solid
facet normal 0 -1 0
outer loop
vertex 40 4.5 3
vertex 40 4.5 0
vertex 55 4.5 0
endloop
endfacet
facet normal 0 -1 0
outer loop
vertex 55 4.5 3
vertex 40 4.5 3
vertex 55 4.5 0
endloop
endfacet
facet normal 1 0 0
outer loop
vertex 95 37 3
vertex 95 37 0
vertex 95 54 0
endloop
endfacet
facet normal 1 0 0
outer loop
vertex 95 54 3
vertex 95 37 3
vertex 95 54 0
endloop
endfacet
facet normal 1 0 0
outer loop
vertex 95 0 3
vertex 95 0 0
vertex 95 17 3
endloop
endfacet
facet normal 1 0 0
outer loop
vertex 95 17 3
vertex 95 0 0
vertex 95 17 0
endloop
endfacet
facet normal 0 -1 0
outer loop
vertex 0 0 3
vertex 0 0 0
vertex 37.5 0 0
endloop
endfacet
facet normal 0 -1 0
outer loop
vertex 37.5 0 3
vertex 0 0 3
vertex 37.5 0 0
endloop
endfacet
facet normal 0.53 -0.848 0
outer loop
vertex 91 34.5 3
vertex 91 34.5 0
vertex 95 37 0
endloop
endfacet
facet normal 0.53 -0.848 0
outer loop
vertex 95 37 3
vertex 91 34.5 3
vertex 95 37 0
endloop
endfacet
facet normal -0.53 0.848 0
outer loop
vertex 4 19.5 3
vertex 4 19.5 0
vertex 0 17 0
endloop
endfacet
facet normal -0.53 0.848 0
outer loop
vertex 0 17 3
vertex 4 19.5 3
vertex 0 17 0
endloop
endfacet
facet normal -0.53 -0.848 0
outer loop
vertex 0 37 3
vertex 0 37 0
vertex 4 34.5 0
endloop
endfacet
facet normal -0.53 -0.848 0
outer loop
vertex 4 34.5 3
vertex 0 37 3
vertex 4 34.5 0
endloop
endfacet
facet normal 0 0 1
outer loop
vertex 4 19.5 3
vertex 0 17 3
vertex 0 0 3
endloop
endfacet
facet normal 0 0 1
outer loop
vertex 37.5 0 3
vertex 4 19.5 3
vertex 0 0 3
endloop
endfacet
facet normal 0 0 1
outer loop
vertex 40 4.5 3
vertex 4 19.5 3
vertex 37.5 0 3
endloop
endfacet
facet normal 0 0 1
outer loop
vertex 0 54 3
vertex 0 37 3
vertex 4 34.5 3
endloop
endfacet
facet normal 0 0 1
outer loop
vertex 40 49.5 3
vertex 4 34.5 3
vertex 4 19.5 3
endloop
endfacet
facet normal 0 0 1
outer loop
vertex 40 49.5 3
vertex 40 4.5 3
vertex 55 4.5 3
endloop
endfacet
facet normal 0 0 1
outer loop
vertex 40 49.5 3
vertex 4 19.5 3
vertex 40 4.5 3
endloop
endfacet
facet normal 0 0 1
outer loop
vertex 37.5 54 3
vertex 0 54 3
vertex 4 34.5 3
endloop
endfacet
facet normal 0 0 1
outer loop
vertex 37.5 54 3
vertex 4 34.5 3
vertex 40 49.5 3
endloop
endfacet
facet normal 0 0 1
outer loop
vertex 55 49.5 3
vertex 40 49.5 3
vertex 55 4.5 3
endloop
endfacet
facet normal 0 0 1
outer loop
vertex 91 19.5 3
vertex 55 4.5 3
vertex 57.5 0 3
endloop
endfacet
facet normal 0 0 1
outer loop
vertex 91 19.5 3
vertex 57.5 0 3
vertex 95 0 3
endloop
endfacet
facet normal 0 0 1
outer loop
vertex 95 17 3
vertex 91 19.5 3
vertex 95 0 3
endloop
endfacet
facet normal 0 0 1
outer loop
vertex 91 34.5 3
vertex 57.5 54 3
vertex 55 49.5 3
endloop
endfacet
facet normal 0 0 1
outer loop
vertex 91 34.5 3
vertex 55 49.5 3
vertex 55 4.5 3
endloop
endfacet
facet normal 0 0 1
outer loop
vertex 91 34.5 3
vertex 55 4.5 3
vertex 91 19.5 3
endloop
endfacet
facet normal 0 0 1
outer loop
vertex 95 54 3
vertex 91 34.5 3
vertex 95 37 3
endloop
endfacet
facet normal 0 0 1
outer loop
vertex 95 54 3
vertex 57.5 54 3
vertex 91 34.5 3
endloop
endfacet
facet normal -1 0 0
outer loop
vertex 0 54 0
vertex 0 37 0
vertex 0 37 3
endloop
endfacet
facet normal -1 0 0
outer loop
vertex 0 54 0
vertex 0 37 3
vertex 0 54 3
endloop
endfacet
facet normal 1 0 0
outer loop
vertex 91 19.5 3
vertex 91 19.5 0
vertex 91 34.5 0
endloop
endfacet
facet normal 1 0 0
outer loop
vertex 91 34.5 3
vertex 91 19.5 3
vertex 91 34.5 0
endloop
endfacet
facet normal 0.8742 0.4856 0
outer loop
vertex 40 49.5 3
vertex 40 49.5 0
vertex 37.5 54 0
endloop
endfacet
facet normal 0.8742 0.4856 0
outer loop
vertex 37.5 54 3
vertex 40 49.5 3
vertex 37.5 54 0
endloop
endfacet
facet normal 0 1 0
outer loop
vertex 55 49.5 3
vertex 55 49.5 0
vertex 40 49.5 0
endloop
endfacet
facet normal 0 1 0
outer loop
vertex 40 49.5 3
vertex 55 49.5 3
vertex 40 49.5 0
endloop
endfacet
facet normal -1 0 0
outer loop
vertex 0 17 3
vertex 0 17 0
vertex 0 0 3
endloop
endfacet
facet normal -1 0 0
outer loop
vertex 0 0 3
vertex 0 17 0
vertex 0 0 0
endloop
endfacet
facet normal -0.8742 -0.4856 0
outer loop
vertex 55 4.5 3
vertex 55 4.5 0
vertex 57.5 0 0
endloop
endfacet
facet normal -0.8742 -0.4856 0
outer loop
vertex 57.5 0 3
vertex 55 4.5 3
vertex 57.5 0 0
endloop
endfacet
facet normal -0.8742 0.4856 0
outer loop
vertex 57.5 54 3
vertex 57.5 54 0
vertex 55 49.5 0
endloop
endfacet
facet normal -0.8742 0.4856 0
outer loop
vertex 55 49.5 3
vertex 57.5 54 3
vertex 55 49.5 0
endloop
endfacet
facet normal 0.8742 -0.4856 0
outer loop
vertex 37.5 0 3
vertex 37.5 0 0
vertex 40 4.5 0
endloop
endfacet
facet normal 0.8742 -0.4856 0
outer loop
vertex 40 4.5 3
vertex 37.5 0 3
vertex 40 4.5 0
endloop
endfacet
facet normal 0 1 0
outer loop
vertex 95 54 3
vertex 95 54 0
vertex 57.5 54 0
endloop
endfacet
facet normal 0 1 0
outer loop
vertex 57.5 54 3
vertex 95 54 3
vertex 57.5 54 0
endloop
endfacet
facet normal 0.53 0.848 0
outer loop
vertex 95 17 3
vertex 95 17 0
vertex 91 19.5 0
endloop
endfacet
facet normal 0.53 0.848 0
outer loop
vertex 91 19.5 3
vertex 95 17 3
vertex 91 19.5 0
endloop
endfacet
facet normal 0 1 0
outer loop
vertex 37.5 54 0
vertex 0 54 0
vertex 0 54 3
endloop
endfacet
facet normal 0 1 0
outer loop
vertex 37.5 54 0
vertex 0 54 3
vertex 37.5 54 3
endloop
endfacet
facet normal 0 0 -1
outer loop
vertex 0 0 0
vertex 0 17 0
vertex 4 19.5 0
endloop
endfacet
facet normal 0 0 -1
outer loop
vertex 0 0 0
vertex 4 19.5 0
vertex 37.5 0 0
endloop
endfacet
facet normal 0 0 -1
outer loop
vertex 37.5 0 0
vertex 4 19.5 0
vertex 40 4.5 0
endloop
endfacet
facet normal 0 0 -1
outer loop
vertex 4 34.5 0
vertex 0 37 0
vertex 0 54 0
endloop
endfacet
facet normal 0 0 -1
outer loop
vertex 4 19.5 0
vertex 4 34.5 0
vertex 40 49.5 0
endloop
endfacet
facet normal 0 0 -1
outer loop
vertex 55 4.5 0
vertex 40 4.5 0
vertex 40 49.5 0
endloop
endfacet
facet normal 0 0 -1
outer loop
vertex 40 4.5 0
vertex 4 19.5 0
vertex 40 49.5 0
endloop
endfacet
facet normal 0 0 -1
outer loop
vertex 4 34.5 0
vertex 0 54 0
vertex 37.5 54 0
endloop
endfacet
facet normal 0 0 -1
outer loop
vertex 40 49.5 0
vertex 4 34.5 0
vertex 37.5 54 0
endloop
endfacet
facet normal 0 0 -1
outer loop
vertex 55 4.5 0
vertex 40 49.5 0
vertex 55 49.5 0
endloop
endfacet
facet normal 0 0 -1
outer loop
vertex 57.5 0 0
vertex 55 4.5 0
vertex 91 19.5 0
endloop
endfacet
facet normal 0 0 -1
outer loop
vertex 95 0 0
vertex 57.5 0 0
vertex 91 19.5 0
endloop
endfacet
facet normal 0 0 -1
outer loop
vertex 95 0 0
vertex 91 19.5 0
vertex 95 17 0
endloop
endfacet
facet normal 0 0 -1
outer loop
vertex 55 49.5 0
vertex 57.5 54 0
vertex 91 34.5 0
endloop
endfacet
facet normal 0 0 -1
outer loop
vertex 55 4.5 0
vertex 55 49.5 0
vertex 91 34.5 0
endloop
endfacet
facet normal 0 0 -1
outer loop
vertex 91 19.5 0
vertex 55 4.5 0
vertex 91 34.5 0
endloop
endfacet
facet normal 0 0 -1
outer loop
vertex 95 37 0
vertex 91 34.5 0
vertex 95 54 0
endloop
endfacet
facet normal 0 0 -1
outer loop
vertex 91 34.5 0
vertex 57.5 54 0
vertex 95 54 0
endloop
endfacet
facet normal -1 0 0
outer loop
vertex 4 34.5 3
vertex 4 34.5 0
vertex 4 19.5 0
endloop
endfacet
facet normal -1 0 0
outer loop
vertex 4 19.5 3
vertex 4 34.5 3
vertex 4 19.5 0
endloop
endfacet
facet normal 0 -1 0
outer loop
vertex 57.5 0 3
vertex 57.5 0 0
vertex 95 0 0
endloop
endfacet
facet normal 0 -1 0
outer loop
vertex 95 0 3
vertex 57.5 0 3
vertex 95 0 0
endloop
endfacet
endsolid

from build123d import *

# Parameters (mm, degrees)
F0_W     = 37.5
F0_H     = 17
F1_DEPTH = 3


# Not quite as in the source:
# - a feature names something its author has since deleted; it is built from what else it names


with BuildPart() as f1:
    # F0 (on Top) → F1 (new body)
    with BuildSketch(Plane.XY):
        with Locations((18.75, 45.5)):
            Rectangle(F0_W, F0_H)
        Polygon((95, 37), (37.5, 37), (37.5, 0), (40, 4.5), (47.5, 4.5), (55, 4.5), (57.5, 0), (95, 0), (95, 17), (91, 19.5), (91, 27), (91, 34.5), align=None)
        Polygon((40, 49.5), (37.5, 54), (37.5, 37), (95, 37), (95, 54), (57.5, 54), (55, 49.5), (47.5, 49.5), align=None)
        Polygon((37.5, 37), (0, 37), (4, 34.5), (4, 27), (4, 19.5), (0, 17), (0, 0), (37.5, 0), align=None)
    extrude(amount=F1_DEPTH)


solid = f1.part
